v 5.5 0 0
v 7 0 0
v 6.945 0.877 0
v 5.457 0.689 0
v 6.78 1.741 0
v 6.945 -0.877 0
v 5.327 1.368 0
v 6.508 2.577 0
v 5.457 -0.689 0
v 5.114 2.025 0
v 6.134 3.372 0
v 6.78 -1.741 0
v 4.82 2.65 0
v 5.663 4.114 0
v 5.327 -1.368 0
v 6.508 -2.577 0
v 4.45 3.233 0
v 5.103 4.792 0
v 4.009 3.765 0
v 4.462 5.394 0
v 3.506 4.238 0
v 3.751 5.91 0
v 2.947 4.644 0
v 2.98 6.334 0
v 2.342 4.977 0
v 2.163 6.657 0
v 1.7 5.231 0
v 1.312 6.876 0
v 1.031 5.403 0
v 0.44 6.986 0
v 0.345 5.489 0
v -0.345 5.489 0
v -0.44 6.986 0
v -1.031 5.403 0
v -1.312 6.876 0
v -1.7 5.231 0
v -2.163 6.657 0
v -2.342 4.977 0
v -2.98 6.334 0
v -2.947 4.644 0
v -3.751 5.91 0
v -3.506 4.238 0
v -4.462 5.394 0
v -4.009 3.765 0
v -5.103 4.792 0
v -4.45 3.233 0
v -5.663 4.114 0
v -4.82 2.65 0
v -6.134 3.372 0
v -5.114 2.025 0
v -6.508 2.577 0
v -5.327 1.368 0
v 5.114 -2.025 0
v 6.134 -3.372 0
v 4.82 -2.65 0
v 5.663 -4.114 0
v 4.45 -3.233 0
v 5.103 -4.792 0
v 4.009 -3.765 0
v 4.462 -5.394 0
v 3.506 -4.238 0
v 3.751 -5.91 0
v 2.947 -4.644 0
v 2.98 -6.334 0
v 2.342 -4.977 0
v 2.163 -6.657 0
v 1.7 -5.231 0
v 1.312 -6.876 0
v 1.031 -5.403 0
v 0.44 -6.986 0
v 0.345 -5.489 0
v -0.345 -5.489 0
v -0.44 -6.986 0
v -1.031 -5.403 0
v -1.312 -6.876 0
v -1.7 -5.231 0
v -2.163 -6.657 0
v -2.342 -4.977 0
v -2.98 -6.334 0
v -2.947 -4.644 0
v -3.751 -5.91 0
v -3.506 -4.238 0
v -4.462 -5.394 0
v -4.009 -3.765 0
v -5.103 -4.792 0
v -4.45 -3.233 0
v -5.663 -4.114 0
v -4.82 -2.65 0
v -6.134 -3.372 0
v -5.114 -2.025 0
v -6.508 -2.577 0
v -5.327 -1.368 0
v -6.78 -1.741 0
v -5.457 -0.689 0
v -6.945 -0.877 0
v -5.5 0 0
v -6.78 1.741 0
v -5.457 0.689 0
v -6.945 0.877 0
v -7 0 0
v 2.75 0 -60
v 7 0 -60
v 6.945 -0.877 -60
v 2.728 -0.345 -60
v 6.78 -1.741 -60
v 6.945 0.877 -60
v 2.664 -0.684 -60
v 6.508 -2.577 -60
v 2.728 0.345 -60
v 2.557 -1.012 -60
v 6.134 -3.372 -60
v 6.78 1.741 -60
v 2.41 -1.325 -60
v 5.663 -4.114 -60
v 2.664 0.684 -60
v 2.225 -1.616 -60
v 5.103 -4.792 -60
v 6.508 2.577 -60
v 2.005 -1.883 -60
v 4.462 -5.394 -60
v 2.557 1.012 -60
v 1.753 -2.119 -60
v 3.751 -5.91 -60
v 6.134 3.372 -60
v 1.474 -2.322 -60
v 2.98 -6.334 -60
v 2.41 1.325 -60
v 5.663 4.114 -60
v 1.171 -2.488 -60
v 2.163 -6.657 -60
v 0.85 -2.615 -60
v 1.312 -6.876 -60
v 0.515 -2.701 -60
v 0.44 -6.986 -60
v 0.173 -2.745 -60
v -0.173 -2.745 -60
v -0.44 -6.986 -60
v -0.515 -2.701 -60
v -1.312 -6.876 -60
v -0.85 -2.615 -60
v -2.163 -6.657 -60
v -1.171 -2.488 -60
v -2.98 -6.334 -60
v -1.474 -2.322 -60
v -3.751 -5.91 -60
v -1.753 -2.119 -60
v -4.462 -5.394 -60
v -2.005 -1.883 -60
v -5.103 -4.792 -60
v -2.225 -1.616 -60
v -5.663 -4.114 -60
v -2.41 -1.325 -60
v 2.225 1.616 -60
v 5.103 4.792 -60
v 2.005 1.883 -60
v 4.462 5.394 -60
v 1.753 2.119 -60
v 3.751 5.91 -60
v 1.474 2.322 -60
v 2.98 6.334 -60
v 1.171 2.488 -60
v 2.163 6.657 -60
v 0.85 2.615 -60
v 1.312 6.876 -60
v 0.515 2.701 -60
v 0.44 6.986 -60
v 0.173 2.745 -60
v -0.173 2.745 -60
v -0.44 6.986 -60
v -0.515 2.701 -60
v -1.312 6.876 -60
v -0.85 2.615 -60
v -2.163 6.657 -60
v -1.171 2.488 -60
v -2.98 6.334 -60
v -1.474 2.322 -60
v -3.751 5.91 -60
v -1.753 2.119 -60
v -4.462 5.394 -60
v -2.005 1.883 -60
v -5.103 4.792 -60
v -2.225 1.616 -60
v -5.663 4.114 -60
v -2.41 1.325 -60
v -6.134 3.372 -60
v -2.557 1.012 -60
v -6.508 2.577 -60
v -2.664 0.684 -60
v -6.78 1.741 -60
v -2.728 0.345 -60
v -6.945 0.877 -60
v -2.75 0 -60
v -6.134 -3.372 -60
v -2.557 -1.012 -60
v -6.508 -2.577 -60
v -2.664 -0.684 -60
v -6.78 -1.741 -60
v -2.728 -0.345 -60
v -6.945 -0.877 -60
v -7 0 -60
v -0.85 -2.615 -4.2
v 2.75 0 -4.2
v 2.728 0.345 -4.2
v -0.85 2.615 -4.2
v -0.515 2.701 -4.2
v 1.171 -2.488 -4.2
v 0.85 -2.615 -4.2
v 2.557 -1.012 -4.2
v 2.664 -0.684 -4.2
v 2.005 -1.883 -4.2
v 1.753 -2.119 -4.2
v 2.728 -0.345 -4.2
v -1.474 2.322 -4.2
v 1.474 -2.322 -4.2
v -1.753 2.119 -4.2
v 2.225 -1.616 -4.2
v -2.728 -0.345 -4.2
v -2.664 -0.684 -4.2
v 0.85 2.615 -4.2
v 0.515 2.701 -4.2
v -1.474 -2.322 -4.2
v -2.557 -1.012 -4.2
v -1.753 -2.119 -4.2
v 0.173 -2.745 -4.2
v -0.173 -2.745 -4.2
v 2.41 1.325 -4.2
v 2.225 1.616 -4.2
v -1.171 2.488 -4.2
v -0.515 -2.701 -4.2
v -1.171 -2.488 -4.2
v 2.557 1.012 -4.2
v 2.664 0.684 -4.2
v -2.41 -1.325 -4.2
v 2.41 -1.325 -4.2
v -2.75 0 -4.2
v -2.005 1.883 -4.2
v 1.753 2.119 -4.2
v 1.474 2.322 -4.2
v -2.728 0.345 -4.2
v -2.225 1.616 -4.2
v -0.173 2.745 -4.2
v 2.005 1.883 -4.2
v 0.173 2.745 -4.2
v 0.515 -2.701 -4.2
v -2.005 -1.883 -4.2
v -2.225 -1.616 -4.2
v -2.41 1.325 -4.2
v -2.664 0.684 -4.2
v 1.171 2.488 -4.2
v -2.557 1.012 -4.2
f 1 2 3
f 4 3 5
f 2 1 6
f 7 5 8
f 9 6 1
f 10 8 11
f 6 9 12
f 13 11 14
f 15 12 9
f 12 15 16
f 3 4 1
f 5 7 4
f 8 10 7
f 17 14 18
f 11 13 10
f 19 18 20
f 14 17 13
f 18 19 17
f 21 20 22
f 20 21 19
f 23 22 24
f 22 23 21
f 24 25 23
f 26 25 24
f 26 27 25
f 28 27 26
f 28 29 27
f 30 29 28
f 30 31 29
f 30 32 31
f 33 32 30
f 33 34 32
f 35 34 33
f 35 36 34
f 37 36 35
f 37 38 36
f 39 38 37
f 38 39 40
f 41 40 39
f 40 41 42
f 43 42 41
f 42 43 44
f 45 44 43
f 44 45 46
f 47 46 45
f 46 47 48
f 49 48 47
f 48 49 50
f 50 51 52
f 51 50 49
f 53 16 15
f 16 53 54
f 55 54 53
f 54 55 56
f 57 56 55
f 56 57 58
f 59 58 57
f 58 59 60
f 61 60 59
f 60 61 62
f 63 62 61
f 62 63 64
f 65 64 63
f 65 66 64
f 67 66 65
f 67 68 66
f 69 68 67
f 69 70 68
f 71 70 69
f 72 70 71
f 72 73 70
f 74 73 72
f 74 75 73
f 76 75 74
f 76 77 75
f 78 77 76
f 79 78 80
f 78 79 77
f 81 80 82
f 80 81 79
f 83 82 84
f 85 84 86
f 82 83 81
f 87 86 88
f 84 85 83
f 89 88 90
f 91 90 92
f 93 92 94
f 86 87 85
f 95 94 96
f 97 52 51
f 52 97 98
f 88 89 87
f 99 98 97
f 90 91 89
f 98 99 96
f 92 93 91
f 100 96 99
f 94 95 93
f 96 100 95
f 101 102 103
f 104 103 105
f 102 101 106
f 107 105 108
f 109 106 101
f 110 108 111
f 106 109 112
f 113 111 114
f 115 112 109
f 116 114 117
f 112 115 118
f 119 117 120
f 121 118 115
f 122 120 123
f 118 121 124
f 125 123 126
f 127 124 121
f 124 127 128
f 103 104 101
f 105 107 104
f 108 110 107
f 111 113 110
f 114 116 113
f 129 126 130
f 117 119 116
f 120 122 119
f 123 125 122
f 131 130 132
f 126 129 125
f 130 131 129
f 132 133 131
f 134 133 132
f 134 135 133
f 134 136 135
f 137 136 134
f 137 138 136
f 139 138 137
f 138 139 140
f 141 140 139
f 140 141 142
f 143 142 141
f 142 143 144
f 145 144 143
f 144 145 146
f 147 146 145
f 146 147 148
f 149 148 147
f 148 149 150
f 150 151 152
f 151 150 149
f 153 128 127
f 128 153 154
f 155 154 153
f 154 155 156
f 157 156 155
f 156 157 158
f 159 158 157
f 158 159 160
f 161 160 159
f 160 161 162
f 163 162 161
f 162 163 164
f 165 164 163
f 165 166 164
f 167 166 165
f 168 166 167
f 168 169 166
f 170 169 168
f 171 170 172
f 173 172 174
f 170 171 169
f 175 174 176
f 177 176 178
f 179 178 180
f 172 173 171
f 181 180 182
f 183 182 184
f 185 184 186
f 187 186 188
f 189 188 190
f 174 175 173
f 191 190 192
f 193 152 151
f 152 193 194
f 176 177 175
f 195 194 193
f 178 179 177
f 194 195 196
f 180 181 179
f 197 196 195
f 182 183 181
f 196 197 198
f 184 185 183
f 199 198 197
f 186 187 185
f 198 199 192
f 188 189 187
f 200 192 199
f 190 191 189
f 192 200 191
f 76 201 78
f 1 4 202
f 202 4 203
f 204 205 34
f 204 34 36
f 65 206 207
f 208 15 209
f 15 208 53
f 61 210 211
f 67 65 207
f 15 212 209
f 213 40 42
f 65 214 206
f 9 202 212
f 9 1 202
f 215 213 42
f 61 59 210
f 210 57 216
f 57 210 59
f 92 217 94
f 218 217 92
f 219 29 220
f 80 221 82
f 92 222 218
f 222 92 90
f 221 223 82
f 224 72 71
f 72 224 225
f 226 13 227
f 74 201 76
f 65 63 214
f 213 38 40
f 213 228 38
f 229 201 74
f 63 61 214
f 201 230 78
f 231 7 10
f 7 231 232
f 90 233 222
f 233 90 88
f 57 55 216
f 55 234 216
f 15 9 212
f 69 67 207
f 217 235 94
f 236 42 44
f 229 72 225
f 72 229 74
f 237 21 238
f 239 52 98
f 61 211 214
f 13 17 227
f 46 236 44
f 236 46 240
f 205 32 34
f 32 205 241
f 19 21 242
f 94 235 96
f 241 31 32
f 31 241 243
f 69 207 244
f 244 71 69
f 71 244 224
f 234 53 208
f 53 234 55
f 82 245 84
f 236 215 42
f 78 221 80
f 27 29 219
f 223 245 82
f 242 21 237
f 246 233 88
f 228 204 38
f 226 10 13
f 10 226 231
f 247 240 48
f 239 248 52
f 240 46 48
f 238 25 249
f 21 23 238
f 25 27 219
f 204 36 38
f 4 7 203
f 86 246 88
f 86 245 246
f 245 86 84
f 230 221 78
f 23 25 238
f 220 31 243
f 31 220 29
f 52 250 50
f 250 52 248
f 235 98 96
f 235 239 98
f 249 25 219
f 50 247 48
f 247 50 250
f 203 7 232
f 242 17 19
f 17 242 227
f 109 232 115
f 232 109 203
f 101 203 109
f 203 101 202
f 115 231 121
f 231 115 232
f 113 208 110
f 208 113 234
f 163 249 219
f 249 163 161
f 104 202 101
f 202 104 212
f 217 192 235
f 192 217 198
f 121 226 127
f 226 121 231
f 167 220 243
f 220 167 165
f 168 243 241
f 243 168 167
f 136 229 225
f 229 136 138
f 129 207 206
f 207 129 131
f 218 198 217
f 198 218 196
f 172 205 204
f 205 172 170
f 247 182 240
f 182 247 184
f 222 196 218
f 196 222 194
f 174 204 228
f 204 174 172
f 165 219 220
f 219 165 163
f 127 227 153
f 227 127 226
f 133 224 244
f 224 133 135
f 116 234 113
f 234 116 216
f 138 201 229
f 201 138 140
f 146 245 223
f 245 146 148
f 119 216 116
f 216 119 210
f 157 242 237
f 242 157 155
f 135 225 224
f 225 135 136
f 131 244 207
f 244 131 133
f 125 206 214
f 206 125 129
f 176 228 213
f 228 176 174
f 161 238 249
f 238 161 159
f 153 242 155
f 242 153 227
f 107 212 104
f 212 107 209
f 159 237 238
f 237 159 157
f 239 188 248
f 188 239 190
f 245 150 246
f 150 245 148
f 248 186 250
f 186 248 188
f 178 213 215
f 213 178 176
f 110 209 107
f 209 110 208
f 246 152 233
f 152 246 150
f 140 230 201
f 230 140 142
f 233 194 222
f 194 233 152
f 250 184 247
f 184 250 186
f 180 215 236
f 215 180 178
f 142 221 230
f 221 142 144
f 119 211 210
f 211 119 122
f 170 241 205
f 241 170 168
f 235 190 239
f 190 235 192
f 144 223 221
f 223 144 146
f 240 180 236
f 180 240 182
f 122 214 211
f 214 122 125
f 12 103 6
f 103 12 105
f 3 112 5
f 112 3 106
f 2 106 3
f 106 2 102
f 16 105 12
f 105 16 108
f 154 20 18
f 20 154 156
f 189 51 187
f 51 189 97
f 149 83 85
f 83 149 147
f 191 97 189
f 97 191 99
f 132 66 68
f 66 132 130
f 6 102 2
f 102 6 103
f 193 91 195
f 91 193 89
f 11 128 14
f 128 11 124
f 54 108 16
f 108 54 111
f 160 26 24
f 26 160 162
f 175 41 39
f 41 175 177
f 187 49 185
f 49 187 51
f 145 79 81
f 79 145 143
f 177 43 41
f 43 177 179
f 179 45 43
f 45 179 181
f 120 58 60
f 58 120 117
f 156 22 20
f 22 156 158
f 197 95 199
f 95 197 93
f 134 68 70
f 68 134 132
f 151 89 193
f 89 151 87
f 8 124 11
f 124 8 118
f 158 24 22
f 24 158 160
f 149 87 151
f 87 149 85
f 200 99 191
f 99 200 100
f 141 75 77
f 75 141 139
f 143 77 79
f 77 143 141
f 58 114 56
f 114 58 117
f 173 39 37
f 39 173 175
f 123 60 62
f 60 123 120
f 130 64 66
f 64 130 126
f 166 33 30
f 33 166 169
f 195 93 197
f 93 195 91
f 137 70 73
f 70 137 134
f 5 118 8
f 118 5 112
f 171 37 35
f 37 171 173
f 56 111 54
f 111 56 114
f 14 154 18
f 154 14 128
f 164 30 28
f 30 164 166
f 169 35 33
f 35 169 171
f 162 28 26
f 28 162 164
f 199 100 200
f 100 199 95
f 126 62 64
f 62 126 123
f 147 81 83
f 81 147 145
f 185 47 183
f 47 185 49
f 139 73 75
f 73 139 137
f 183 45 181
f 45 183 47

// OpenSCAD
$fn = 50;


difference() {
	union() {
		translate(v = [0, 0, -60.0000000000]) {
			cylinder(h = 60, r = 7.0000000000);
		}
	}
	union() {
		translate(v = [0, 0, 0]) {
			rotate(a = [0, 0, 0]) {
				difference() {
					union() {
						#translate(v = [0, 0, -60.0000000000]) {
							cylinder(h = 60, r = 2.2500000000);
						}
						#translate(v = [0, 0, -4.2000000000]) {
							cylinder(h = 4.2000000000, r1 = 2.7500000000, r2 = 5.5000000000);
						}
						#translate(v = [0, 0, -60.0000000000]) {
							cylinder(h = 60, r = 2.7500000000);
						}
						#translate(v = [0, 0, -60.0000000000]) {
							cylinder(h = 60, r = 2.2500000000);
						}
					}
					union();
				}
			}
		}
	}
}
